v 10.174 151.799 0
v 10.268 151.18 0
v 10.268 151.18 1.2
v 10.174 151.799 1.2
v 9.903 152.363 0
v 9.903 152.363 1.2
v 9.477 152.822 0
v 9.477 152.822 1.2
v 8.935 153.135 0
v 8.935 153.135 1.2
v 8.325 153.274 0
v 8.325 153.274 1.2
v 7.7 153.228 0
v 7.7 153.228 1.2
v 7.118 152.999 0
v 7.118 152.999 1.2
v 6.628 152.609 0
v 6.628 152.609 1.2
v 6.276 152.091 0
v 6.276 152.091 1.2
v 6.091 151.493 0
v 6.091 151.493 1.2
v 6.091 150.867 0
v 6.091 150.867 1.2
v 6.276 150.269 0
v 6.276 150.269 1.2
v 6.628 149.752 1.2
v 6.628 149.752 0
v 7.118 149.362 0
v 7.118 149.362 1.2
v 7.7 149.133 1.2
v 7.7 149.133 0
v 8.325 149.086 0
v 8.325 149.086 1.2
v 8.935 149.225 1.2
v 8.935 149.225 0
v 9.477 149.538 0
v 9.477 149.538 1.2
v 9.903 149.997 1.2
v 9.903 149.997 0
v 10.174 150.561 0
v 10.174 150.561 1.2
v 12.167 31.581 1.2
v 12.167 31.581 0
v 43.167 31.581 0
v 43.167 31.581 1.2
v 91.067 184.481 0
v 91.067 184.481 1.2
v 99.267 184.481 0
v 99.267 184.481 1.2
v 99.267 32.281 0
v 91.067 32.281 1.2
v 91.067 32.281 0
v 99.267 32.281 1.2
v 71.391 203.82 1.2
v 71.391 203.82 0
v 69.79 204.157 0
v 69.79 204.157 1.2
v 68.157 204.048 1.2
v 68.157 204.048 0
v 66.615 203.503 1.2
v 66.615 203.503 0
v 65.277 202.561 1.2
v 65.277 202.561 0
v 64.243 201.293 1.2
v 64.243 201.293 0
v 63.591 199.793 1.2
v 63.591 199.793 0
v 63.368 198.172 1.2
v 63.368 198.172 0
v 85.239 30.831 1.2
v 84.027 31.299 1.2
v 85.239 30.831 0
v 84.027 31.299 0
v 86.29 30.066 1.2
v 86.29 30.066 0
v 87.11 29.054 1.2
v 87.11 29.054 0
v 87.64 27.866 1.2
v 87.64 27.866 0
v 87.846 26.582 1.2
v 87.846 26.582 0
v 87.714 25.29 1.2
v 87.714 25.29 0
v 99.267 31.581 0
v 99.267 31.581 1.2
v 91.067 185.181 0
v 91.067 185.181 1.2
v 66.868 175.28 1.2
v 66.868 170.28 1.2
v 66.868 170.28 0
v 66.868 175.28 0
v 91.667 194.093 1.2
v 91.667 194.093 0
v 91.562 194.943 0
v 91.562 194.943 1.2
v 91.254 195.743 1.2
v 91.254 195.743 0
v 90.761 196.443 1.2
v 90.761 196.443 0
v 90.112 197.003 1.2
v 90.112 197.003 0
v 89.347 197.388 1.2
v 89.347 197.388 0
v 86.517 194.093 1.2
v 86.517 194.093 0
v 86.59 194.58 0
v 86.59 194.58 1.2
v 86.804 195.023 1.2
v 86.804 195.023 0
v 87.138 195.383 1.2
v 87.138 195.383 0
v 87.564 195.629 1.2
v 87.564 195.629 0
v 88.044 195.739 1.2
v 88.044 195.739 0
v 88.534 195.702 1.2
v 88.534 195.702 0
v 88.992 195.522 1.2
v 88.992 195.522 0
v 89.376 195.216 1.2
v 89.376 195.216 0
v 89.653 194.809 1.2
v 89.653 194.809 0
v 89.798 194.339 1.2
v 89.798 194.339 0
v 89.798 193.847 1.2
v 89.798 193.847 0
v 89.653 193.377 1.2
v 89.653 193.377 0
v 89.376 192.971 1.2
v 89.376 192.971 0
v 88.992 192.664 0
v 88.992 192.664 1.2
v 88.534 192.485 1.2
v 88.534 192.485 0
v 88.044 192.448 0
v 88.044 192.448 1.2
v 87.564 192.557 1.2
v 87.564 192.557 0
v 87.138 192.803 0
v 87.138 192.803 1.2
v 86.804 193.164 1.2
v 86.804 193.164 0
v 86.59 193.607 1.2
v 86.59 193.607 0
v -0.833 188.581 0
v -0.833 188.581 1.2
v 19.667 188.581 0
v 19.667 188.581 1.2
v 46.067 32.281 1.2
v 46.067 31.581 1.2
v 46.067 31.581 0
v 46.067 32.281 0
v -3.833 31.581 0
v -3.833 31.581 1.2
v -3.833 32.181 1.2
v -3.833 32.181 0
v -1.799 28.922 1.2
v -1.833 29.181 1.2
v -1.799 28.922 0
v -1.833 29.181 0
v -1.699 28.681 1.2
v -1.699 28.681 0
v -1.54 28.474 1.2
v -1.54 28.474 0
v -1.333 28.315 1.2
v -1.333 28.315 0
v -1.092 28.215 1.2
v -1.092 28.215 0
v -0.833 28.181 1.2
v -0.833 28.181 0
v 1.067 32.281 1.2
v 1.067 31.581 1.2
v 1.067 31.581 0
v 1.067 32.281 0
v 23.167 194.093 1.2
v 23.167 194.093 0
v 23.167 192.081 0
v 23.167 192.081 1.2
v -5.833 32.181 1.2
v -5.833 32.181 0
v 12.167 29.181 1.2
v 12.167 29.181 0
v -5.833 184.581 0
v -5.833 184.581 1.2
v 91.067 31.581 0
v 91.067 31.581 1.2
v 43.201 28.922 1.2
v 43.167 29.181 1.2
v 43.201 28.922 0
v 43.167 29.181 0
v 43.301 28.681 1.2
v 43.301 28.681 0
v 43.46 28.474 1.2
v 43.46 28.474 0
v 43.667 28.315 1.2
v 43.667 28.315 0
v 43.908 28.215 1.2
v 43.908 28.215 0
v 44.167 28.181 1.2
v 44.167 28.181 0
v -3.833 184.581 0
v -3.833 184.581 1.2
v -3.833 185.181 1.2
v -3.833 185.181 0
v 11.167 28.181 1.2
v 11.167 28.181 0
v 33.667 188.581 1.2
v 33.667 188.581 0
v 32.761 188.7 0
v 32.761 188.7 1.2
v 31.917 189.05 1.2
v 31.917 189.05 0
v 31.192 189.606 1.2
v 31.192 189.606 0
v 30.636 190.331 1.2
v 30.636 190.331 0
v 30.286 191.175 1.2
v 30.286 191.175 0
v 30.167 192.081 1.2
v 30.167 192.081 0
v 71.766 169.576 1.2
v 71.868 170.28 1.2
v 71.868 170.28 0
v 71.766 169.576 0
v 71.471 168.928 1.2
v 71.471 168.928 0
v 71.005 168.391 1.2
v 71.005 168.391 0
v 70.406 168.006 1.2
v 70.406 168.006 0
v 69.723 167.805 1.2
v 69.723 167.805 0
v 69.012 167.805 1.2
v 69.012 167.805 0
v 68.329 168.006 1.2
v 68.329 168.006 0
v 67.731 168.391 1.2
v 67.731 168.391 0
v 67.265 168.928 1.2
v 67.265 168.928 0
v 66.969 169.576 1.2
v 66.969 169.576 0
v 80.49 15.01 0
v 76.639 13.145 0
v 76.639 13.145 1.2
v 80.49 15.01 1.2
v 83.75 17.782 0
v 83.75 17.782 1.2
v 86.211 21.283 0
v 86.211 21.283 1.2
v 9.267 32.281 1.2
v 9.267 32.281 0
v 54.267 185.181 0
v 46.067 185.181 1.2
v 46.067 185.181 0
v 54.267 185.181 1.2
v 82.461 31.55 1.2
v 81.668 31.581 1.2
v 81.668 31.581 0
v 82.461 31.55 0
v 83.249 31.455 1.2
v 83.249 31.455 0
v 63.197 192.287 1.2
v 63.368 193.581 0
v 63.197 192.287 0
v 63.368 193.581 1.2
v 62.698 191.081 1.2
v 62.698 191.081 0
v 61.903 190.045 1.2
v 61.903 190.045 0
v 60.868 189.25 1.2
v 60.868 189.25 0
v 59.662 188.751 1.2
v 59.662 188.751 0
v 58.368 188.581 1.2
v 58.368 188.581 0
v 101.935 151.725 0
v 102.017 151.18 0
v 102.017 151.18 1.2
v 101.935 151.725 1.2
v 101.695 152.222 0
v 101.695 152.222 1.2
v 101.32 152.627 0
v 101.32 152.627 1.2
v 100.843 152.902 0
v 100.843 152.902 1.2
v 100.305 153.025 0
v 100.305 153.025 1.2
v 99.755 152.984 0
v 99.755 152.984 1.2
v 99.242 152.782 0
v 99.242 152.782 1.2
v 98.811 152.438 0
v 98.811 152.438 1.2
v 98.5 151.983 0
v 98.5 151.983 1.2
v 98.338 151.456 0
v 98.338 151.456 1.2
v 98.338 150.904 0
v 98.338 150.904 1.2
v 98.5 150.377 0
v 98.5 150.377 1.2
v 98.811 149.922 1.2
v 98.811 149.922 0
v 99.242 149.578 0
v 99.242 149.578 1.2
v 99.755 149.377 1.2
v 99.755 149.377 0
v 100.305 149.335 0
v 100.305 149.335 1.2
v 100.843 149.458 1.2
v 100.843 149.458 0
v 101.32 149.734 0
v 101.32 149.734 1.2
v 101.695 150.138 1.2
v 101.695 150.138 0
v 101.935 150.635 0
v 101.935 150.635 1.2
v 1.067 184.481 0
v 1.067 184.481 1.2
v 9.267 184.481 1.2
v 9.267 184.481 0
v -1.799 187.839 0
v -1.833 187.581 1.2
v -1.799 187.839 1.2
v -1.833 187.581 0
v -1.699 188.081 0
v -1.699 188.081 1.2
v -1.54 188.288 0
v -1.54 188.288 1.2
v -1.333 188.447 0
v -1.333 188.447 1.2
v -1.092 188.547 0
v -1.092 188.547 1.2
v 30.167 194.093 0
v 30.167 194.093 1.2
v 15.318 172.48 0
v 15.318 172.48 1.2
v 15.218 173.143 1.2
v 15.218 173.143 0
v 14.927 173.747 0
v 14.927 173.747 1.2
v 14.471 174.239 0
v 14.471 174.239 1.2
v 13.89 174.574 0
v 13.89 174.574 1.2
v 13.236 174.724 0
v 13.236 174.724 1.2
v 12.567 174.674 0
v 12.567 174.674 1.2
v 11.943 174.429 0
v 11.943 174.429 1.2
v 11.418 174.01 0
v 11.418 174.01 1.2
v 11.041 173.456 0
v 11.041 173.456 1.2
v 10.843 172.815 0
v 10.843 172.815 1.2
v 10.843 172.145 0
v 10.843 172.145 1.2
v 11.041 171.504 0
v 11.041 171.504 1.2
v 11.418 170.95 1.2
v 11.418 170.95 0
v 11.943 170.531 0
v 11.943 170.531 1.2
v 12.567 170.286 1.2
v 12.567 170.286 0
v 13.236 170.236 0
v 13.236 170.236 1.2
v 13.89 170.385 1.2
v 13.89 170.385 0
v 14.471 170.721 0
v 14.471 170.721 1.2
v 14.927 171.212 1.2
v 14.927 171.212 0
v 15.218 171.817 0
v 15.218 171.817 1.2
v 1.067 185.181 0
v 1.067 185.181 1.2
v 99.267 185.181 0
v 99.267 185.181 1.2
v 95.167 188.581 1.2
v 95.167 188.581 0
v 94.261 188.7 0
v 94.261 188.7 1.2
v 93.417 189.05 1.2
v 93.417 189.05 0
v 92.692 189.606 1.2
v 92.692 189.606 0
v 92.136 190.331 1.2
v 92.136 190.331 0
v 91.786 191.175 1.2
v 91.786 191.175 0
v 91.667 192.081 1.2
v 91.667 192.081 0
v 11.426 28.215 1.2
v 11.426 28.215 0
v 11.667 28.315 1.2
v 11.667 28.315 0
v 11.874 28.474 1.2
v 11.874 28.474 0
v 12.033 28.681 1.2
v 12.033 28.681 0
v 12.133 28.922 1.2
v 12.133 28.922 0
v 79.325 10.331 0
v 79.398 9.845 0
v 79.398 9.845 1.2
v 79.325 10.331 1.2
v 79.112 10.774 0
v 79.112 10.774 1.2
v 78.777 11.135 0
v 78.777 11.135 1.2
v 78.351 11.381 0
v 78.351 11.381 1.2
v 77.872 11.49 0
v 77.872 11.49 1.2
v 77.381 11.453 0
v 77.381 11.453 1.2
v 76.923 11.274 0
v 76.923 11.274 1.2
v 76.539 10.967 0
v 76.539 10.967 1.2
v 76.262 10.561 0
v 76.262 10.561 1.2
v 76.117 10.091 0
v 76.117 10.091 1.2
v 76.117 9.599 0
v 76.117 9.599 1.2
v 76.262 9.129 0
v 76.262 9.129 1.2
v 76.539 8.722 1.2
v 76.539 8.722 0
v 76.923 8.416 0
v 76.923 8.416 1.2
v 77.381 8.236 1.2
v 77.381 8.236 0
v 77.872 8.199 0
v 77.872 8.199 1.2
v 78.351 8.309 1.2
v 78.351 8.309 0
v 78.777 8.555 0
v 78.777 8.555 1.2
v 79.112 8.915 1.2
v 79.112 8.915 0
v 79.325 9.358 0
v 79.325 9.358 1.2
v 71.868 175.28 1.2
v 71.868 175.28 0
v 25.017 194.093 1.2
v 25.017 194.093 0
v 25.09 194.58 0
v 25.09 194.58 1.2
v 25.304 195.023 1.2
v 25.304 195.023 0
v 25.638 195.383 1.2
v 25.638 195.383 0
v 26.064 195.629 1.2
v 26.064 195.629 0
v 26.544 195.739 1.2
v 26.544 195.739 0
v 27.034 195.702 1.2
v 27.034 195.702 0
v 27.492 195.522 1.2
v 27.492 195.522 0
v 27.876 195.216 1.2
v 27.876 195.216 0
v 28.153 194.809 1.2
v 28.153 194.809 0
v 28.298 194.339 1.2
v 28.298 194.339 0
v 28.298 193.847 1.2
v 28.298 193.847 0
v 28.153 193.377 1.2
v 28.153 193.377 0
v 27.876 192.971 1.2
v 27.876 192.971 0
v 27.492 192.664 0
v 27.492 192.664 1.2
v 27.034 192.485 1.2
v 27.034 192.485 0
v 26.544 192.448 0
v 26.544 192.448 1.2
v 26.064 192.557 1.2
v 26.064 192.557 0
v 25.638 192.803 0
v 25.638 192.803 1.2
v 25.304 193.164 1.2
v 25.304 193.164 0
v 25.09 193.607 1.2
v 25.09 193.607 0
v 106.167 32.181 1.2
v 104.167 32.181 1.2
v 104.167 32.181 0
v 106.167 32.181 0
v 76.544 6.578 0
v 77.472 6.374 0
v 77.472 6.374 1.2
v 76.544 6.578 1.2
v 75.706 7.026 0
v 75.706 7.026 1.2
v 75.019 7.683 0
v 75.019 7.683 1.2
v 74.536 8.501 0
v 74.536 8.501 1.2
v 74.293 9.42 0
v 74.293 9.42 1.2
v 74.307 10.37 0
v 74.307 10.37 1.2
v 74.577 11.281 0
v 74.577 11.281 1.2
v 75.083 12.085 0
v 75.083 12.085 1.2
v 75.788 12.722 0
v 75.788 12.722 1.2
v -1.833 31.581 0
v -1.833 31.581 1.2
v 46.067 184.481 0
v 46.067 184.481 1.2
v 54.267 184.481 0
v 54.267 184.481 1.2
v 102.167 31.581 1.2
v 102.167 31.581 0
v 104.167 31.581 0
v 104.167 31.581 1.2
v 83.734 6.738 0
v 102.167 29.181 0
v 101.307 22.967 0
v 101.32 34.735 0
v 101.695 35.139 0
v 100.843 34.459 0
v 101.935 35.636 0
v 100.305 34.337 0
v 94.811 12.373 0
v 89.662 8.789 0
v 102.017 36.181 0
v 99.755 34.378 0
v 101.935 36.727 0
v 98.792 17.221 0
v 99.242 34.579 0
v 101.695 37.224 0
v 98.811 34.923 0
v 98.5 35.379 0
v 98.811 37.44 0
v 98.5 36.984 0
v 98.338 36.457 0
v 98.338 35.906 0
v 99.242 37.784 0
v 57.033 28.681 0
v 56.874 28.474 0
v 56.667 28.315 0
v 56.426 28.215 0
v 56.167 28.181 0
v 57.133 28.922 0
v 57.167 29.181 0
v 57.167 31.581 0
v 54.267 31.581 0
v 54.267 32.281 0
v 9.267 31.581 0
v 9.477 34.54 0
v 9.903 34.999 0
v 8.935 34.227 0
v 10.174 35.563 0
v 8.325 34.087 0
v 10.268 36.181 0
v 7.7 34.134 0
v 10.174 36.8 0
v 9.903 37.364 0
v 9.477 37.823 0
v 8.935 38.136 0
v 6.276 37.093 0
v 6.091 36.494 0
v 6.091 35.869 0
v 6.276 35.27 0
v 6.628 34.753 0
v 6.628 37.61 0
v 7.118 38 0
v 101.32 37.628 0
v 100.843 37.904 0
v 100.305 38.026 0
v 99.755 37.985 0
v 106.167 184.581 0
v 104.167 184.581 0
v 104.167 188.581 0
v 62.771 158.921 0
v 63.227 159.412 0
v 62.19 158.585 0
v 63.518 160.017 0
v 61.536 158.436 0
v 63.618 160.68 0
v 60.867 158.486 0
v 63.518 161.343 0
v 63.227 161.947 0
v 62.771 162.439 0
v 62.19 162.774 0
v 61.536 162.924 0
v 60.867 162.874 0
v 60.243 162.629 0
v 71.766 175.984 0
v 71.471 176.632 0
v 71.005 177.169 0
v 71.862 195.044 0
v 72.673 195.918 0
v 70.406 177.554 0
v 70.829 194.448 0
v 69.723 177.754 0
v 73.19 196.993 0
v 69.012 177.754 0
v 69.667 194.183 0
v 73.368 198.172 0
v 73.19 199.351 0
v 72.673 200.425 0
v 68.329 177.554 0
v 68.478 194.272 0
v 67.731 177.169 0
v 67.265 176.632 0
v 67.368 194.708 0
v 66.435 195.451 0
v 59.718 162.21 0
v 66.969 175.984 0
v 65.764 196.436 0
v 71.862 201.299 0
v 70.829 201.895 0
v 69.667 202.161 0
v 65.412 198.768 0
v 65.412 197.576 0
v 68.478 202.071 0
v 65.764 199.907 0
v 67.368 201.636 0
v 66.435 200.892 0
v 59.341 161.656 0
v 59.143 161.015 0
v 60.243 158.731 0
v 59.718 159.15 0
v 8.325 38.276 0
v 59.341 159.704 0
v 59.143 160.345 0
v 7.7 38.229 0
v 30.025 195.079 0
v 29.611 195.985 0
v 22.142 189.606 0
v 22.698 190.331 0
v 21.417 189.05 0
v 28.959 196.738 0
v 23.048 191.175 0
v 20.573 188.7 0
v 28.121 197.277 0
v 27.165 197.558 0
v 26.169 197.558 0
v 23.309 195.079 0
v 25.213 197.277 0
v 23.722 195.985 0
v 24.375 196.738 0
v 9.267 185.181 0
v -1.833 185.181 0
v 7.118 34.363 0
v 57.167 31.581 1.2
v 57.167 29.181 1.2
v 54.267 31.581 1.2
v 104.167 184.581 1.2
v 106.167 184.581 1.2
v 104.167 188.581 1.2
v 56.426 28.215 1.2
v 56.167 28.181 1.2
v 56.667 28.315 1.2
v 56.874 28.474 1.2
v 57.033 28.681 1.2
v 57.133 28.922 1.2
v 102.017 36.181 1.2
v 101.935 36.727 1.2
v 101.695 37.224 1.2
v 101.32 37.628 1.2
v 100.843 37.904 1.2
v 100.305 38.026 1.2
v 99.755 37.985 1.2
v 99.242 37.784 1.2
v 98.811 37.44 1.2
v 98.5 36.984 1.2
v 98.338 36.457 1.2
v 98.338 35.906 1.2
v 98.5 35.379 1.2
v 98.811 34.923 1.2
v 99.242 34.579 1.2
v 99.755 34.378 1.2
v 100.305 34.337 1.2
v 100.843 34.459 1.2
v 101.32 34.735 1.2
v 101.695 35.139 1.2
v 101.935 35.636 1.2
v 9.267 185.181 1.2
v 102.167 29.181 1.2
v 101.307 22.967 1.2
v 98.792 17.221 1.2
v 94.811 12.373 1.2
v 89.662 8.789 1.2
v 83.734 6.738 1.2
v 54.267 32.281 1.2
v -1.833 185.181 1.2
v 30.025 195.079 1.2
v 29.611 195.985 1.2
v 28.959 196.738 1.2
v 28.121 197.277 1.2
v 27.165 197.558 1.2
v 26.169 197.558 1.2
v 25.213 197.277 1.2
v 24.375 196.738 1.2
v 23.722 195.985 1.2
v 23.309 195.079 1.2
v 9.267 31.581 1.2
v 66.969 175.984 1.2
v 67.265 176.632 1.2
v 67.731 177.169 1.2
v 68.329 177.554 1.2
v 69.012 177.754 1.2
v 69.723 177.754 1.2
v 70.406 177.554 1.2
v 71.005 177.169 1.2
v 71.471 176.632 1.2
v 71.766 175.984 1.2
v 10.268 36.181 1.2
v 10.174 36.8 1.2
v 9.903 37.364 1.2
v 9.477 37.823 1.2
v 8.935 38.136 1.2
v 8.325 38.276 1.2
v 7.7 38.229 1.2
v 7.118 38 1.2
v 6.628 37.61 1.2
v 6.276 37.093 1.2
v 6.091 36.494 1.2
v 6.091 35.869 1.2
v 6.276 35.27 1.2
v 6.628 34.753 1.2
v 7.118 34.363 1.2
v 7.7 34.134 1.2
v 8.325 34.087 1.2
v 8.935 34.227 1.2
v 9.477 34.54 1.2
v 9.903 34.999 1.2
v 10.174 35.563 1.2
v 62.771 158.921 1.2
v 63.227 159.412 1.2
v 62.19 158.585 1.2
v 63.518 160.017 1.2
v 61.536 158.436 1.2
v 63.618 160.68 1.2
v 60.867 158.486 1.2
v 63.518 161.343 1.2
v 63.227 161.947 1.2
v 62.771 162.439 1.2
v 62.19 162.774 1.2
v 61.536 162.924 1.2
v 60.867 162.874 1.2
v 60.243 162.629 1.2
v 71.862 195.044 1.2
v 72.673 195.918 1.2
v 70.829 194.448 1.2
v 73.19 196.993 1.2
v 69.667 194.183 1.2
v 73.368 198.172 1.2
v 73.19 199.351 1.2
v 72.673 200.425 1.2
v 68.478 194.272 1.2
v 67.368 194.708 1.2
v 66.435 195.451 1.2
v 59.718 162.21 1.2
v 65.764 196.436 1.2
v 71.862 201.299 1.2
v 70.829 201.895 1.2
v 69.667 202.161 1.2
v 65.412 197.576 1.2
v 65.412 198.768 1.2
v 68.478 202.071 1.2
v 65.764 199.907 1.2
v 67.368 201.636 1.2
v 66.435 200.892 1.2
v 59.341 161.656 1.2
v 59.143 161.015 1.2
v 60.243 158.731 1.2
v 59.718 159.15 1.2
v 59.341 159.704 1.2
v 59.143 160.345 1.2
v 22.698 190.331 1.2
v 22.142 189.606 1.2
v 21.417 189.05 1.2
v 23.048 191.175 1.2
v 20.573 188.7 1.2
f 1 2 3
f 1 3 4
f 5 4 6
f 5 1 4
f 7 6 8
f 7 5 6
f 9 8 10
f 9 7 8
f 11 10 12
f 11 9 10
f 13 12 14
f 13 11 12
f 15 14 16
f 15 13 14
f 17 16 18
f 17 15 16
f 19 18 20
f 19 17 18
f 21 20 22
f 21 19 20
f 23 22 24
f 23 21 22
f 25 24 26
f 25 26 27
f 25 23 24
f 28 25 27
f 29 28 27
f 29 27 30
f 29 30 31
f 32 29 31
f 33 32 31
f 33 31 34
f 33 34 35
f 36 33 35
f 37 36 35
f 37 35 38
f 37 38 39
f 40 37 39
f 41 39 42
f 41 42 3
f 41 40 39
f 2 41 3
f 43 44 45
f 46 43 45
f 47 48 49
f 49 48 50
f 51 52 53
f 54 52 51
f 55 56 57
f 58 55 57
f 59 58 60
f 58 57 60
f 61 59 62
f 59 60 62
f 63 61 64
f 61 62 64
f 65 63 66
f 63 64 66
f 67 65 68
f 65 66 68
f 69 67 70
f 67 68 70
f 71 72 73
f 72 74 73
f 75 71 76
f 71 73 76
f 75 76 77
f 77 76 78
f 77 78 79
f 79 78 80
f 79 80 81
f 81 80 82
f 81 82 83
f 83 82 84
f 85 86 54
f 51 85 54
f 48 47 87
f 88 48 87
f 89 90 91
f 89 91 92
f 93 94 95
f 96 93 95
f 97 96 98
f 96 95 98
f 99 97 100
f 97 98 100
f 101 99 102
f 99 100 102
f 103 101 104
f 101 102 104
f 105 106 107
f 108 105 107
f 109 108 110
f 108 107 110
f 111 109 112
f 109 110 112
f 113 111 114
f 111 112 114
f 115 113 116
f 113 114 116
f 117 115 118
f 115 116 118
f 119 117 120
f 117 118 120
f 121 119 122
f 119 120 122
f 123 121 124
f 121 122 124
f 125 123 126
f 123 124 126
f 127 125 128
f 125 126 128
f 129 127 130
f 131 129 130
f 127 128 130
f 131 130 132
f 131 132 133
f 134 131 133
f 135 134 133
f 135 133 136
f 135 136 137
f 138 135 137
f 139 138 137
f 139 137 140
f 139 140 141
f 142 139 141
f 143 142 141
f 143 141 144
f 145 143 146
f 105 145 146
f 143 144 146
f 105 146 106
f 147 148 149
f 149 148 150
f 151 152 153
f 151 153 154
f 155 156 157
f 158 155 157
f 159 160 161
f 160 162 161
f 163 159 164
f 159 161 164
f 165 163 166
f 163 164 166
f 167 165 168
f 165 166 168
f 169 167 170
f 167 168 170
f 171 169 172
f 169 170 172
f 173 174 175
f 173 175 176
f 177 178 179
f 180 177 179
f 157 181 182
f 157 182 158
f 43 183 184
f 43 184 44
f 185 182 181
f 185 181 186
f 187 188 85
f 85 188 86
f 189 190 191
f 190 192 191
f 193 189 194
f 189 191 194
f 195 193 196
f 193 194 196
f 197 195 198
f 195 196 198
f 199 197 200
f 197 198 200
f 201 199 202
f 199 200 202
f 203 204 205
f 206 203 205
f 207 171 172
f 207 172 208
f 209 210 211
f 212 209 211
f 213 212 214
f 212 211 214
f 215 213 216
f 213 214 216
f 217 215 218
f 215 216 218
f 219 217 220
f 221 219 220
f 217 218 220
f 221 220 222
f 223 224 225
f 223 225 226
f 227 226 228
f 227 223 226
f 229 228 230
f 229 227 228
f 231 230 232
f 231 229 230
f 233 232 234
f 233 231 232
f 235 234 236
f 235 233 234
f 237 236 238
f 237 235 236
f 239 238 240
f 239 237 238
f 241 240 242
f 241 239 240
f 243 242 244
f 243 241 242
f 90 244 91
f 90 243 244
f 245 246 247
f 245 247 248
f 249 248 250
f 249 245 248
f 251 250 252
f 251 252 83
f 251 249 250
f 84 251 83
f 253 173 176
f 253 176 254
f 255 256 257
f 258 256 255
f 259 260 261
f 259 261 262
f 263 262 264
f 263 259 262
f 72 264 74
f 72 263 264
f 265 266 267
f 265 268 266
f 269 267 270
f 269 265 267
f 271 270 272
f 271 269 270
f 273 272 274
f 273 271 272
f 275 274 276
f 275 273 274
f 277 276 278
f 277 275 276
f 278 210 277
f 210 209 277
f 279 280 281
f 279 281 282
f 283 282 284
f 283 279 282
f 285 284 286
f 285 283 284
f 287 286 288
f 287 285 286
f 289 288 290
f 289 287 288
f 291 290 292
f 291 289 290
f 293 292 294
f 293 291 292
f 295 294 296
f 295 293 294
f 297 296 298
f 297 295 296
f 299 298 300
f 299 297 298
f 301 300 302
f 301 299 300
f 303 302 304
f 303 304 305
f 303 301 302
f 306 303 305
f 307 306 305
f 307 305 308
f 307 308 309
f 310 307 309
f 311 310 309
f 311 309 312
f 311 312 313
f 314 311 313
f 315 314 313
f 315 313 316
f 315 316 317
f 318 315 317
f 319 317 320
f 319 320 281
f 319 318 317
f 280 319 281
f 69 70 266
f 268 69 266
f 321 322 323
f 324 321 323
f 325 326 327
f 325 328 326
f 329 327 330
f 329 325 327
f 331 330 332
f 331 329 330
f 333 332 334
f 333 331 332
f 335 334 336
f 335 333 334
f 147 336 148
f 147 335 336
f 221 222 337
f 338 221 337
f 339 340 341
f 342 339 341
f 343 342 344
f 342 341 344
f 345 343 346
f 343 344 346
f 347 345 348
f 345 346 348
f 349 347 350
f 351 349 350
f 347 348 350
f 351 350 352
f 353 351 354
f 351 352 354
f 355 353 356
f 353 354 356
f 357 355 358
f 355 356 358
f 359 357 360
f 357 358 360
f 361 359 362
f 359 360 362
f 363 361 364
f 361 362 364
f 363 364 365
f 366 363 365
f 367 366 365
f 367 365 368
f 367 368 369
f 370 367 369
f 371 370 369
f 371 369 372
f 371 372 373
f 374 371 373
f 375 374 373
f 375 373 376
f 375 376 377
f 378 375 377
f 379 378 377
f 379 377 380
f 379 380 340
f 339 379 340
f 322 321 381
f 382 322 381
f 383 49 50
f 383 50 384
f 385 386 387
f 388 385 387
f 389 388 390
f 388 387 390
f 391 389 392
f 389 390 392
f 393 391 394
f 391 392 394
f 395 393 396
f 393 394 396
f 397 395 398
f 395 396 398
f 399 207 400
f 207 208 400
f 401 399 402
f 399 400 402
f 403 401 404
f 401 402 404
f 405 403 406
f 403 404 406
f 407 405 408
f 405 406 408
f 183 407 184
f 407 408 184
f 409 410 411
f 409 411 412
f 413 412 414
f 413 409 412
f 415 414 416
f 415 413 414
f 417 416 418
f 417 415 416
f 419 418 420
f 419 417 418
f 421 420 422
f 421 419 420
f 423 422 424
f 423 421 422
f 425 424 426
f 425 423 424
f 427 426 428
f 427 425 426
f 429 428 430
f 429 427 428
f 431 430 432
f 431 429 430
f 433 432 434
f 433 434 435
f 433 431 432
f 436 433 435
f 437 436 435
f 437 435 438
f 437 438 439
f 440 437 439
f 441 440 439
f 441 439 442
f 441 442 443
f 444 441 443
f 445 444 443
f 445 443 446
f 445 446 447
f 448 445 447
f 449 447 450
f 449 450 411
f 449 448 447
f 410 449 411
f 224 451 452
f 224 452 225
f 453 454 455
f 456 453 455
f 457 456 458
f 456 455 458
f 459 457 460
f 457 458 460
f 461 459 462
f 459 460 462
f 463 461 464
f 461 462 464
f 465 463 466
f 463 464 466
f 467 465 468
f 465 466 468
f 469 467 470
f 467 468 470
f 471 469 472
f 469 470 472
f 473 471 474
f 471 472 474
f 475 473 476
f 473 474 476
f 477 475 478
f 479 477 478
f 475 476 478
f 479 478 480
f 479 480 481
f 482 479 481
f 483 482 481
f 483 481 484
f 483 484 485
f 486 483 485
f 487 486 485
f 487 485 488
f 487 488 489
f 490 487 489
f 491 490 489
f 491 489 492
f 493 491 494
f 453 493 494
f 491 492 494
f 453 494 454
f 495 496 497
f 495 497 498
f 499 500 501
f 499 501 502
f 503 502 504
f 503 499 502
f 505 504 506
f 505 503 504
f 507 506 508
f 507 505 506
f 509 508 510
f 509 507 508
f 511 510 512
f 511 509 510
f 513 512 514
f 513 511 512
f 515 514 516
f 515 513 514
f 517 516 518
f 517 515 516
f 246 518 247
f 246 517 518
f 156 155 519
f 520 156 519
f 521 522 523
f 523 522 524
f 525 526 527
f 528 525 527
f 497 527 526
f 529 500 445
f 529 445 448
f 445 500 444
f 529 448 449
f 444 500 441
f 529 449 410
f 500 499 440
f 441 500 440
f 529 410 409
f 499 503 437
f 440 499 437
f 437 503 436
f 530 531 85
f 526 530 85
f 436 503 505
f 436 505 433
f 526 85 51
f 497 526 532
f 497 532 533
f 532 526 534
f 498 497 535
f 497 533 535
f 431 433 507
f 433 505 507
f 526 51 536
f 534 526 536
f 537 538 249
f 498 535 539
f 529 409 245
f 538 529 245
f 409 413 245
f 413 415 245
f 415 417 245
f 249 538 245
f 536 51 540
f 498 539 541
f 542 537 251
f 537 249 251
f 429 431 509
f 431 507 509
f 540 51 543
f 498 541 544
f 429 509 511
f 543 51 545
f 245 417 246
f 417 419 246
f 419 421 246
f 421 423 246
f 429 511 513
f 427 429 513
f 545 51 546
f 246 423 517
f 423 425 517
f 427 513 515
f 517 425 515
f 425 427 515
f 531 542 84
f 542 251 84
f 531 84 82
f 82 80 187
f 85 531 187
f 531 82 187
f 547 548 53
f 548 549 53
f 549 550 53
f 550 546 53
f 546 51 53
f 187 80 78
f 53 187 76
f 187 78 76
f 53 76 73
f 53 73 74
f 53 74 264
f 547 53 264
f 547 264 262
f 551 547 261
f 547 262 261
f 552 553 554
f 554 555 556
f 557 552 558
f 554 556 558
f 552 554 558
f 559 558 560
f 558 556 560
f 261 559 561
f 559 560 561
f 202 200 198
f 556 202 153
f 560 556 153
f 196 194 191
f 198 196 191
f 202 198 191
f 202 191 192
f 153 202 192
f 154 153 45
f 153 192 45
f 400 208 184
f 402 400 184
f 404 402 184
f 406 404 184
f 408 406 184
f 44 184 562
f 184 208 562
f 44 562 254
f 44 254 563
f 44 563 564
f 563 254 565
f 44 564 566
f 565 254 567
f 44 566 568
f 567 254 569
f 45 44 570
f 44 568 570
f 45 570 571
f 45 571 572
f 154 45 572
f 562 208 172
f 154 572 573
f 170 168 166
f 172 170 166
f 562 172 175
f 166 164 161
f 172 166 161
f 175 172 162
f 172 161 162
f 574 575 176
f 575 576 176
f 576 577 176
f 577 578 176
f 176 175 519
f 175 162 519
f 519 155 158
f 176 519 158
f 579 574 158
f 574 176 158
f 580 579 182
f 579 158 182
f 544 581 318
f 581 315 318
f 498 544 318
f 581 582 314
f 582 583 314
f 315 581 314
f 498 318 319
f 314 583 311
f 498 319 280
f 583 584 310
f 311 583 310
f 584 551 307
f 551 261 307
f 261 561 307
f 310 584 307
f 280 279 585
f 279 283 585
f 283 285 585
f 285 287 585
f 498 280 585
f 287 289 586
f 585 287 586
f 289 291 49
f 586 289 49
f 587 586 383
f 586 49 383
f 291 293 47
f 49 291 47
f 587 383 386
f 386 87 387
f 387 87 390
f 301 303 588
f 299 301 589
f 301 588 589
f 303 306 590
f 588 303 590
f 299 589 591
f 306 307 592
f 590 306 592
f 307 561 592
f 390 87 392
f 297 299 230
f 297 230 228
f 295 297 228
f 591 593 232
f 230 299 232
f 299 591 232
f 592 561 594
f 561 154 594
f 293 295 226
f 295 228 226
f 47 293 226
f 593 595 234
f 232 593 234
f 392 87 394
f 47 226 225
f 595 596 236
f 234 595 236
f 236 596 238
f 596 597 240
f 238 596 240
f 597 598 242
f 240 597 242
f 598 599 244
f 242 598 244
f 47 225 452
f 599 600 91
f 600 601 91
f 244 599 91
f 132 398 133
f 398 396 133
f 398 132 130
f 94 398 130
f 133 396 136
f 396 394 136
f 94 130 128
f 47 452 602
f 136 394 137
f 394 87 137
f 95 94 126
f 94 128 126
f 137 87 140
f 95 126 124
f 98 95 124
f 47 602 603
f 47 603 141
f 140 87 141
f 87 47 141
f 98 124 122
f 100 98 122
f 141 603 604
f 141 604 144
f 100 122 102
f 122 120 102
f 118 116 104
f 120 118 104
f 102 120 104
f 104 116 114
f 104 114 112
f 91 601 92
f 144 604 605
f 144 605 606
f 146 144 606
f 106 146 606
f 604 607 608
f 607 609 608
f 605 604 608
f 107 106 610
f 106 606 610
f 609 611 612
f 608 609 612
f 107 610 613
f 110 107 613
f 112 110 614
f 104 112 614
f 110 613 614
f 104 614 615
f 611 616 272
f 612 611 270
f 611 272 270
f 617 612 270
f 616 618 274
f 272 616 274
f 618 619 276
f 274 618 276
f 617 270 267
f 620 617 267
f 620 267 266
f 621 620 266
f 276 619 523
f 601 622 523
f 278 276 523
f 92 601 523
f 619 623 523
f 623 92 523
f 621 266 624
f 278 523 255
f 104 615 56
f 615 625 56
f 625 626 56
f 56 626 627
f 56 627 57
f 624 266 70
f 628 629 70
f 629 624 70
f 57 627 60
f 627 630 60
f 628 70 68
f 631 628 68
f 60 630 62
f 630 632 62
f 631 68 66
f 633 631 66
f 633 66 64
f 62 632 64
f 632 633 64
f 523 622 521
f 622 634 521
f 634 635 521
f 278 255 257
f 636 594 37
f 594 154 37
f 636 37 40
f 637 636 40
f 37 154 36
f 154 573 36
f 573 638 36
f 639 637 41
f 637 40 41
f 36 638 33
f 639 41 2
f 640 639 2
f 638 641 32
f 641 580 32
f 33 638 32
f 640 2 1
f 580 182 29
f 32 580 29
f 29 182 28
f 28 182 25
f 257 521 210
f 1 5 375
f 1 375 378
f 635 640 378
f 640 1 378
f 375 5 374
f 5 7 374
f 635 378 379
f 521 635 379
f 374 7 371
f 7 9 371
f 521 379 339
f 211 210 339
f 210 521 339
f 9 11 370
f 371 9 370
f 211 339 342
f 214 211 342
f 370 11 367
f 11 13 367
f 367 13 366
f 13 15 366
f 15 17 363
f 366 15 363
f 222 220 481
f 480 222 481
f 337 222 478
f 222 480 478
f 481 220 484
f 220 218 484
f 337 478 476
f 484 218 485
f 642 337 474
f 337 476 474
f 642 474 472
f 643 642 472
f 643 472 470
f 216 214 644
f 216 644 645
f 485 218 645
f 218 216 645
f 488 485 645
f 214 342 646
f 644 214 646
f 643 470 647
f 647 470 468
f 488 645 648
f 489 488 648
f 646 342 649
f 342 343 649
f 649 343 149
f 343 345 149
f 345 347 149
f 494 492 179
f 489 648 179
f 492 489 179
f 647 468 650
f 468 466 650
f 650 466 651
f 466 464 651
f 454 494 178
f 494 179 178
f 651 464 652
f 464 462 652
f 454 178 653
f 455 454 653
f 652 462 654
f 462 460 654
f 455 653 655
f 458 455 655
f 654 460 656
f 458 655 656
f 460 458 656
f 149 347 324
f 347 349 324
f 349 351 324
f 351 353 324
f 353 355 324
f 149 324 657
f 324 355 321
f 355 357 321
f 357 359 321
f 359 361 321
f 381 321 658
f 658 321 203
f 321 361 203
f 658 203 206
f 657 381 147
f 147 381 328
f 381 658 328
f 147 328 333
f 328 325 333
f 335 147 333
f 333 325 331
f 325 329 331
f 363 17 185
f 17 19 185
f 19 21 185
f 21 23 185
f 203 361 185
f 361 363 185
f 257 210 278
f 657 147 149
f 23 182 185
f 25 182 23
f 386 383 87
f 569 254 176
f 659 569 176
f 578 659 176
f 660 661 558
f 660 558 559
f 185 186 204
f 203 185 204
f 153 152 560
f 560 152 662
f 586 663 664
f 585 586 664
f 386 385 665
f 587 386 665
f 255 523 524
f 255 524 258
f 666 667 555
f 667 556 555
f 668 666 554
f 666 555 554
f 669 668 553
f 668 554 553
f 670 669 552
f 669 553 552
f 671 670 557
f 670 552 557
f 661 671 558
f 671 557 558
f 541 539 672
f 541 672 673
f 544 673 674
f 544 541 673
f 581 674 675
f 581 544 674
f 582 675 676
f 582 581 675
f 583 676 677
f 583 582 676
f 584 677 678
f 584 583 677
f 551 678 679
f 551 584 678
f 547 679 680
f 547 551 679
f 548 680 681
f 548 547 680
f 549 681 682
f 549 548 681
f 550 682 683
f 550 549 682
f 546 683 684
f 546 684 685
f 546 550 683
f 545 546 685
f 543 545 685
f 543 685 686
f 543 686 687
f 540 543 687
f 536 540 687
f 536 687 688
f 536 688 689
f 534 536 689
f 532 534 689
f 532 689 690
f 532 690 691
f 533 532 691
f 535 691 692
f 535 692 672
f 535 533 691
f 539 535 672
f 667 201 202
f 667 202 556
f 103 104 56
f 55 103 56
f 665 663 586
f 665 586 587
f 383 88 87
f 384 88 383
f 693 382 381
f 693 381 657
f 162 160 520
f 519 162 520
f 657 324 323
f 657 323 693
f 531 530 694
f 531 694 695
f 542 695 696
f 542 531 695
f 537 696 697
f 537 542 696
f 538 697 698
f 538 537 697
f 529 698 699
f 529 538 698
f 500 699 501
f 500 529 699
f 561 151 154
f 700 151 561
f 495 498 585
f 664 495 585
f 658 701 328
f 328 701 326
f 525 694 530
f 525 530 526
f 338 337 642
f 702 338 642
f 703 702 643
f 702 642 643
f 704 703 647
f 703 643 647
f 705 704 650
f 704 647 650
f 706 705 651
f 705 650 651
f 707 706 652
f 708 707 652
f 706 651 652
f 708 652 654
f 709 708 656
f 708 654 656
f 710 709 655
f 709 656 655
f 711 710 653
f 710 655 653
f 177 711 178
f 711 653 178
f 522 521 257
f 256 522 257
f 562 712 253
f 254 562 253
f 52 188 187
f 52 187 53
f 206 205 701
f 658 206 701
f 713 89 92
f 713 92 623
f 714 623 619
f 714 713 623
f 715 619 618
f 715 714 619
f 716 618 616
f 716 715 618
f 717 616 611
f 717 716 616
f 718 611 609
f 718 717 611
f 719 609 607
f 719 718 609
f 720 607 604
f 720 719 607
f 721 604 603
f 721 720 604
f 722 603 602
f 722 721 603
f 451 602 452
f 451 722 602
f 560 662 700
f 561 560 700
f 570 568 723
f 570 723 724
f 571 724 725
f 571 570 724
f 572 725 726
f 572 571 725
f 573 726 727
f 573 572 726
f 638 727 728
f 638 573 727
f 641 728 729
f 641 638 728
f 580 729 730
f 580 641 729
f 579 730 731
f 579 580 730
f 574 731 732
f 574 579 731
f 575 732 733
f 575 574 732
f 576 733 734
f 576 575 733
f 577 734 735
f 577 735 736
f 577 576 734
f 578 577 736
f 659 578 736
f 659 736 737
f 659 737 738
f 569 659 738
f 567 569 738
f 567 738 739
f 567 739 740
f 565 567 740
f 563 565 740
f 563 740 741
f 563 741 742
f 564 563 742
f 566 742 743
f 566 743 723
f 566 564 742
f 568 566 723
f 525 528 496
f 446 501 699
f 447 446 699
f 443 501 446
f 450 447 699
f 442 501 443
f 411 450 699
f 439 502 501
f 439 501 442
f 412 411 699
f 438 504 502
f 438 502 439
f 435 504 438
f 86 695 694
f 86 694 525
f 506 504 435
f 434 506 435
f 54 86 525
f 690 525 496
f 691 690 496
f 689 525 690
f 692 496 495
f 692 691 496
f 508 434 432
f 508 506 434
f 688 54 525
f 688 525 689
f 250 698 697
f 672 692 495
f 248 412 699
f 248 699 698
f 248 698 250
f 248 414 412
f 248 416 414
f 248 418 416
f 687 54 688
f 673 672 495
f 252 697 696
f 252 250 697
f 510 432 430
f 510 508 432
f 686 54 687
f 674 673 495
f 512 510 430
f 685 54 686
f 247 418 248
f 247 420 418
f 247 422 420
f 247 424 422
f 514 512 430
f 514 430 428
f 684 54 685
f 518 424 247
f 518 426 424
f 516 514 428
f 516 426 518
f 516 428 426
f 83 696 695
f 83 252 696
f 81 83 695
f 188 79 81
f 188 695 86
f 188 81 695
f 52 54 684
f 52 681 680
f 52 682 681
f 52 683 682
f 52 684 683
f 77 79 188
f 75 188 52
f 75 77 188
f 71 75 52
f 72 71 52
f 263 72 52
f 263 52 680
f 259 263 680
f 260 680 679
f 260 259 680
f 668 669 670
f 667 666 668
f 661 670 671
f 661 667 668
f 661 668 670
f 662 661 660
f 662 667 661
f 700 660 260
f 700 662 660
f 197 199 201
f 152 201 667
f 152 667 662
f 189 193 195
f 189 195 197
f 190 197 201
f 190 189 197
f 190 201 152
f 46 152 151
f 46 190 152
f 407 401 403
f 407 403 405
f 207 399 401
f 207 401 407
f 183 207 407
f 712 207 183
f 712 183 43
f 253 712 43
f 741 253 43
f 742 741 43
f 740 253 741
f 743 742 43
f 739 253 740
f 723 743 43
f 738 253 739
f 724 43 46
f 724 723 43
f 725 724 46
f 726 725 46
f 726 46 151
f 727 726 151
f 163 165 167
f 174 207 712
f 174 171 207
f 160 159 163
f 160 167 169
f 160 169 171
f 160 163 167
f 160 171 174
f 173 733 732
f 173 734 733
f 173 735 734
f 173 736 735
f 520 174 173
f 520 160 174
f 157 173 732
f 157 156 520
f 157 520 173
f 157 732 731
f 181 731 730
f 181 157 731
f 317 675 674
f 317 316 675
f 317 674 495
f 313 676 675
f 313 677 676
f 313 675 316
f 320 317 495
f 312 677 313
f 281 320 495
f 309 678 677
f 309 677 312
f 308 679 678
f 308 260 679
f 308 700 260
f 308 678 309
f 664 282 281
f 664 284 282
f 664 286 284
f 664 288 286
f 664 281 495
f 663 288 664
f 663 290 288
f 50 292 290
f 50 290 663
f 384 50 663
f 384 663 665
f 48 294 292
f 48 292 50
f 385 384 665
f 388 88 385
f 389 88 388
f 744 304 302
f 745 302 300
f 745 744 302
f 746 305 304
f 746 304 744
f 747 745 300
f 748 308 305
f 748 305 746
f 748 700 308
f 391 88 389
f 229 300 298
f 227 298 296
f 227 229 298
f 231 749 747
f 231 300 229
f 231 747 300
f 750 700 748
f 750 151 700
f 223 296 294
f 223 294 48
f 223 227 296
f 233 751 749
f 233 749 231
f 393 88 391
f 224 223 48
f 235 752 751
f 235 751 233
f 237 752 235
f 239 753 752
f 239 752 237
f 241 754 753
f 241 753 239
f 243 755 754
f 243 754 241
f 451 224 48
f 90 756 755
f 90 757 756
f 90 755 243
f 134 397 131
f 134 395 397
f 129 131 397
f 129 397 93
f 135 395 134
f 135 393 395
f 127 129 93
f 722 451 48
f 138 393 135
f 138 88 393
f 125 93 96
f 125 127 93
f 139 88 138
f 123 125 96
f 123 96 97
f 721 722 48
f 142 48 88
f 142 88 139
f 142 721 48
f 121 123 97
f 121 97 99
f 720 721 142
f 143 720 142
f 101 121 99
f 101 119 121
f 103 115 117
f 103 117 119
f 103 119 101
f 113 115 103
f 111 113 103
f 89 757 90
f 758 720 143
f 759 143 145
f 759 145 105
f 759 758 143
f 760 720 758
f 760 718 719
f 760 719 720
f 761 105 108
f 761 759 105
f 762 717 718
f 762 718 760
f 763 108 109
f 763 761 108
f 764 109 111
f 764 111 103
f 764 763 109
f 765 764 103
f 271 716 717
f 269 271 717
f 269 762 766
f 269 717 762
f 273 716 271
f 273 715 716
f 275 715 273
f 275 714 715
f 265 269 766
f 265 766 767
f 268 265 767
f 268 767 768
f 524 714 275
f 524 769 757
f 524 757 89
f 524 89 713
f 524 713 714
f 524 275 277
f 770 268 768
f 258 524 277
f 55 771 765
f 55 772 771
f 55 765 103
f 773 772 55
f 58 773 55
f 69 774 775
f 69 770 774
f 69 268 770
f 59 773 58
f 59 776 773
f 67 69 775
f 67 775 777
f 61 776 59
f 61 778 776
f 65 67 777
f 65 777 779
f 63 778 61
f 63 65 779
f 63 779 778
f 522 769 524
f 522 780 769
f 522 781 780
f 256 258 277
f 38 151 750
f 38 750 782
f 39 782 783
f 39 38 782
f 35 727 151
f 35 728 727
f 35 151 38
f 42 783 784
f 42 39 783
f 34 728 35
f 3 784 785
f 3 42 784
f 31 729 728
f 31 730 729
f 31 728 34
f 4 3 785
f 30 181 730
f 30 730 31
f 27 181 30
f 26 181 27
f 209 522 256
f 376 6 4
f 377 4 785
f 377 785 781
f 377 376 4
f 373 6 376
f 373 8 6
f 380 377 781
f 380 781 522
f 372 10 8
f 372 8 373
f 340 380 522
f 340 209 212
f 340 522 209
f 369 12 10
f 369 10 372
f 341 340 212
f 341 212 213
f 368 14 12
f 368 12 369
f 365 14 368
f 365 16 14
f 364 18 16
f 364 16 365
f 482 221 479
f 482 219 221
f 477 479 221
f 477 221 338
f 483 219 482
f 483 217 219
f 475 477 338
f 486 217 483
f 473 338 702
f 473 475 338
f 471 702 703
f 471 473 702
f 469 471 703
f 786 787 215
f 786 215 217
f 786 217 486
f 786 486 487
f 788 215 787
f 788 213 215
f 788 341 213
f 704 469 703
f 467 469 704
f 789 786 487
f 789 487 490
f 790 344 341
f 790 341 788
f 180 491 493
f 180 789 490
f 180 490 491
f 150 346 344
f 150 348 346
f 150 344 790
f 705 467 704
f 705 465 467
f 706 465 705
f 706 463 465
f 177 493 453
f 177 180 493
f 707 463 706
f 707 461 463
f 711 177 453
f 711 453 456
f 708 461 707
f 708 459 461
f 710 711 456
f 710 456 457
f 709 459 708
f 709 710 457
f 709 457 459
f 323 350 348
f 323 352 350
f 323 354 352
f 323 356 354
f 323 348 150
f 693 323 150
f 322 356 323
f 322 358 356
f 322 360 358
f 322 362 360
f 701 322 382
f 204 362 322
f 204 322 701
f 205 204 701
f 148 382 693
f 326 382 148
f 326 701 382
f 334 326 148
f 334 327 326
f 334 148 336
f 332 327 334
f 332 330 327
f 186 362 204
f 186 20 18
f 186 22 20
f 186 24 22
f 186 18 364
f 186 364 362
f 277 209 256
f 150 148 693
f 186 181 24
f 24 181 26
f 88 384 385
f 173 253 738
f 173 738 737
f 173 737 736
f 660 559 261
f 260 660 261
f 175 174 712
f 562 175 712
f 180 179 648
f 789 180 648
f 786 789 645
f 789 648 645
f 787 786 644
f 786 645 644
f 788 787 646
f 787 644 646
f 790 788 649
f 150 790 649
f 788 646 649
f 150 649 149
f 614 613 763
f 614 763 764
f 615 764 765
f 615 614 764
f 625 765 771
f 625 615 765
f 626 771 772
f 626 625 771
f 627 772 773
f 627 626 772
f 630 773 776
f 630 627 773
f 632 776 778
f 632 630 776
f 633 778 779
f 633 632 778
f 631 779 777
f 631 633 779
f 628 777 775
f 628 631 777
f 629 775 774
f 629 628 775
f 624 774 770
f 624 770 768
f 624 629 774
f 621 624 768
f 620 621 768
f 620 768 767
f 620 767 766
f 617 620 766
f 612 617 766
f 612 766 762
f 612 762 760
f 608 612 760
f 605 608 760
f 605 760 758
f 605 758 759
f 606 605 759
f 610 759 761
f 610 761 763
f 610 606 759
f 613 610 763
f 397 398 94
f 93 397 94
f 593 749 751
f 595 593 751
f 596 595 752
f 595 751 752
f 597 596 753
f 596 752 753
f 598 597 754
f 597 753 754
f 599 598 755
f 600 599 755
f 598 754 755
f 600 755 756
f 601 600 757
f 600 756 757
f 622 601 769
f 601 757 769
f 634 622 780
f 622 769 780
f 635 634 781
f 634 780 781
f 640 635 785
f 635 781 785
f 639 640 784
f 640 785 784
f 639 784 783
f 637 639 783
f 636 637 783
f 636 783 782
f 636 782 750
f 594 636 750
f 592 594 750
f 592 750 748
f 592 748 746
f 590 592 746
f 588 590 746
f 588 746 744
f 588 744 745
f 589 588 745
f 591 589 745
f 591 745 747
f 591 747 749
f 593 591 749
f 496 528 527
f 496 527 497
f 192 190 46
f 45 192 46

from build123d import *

# Parameters (mm, degrees)
SKETCH2_W           = 112.00010125
SKETCH2_H           = 190.5995575
SKETCH2_R           = 2.1
SKETCH2_R_2         = 1.85
BOSS_EXTRUDE1_DEPTH = 1.2
SKETCH5_W           = 2
SKETCH5_H           = 37.6
SKETCH5_H_2         = 0.6
CUT_EXTRUDE2_DEPTH  = 247.246128205
CUT_EXTRUDE1_DEPTH  = 247.246128205
SKETCH9_W           = 14
SKETCH9_H           = 3.4
SKETCH9_W_2         = 8.5
BOSS_EXTRUDE5_DEPTH = 1.2
FILLET1_R           = 1
CUT_EXTRUDE4_REACH  = 248.246
SKETCH10_W          = 8.2
SKETCH10_H          = 0.7
SKETCH11_R          = 2.25
CUT_EXTRUDE5_DEPTH  = 247.246128205
BOSS_EXTRUDE6_DEPTH = 1.2
SKETCH13_R          = 1.635773904
CUT_EXTRUDE6_DEPTH  = 248.202612706
SKETCH15_W          = 166.29246115
SKETCH15_H          = 51.52086731
CUT_EXTRUDE7_DEPTH  = 10
SKETCH17_R          = 1.65
BOSS_EXTRUDE7_DEPTH = 1.2
BOSS_EXTRUDE8_START = -1.2
SKETCH18_R          = 1.65
BOSS_EXTRUDE8_DEPTH = 1.2
BOSS_EXTRUDE9_START = -1.2
SKETCH19_R          = 4
BOSS_EXTRUDE9_DEPTH = 1.2
FILLET3_R           = 5
FILLET8_R           = 10
FILLET10_R          = 5


with BuildPart() as part:
    # Sketch2 → Boss-Extrude1 (new body)
    with BuildSketch(Plane.XY):
        with Locations((50.167238625, 126.88082875)):
            Rectangle(SKETCH2_W, SKETCH2_H)
        with Locations((8.16763175, 151.180160625)):
            Circle(SKETCH2_R, mode=Mode.SUBTRACT)
        with Locations((100.1668405, 151.180160625)):
            Circle(SKETCH2_R_2, mode=Mode.SUBTRACT)
        with Locations((100.1668405, 36.181495)):
            Circle(SKETCH2_R_2, mode=Mode.SUBTRACT)
        with Locations((8.16763175, 36.181495)):
            Circle(SKETCH2_R, mode=Mode.SUBTRACT)
    extrude(amount=BOSS_EXTRUDE1_DEPTH)

    # Sketch5 → Cut-Extrude2 (cut, through all)
    with BuildSketch(Plane.XY.offset(1.2)):
        Polygon((-3.832812, 185.1806075), (6.667188, 185.1806075), (6.667188, 222.1806075), (-5.832812, 222.1806075), (-5.832812, 185.1806075), (-5.832812, 184.5806075), (-3.832812, 184.5806075), align=None)
        with Locations((105.16728925, 203.3806075)):
            Rectangle(SKETCH5_W, SKETCH5_H)
        with Locations((-4.832812, 31.88105)):
            Rectangle(SKETCH5_W, SKETCH5_H_2)
        with Locations((105.16728925, 31.88105)):
            Rectangle(SKETCH5_W, SKETCH5_H_2)
    extrude(amount=-CUT_EXTRUDE2_DEPTH, mode=Mode.SUBTRACT)

    # Sketch4 → Cut-Extrude1 (cut, through all)
    with BuildSketch(Plane.XY.offset(1.2)):
        with BuildLine():
            Line((55.16728925, 218.1806075), (98.16728925, 218.1806075))
            ThreePointArc((98.16728925, 218.1806075), (99.581502812, 217.594821062), (100.16728925, 216.1806075))
            Line((100.16728925, 216.1806075), (100.16728925, 192.1806075))
            ThreePointArc((100.16728925, 192.1806075), (99.581502812, 190.766393938), (98.16728925, 190.1806075))
            Line((98.16728925, 190.1806075), (55.16728925, 190.1806075))
            ThreePointArc((55.16728925, 190.1806075), (53.753075688, 190.766393938), (53.16728925, 192.1806075))
            Line((53.16728925, 192.1806075), (53.16728925, 216.1806075))
            ThreePointArc((53.16728925, 216.1806075), (53.753075688, 217.594821062), (55.16728925, 218.1806075))
        make_face()
    extrude(amount=-CUT_EXTRUDE1_DEPTH, mode=Mode.SUBTRACT)

    # Sketch9 → Boss-Extrude5 (add)
    with BuildSketch(Plane.XY.offset(1.2)):
        with Locations((5.167188, 29.88105)):
            Rectangle(SKETCH9_W, SKETCH9_H)
        with Locations((95.16728925, 29.88105)):
            Rectangle(SKETCH9_W, SKETCH9_H)
        with Locations((50.167238625, 29.88105)):
            Rectangle(SKETCH9_W, SKETCH9_H)
        with Locations((2.417188, 186.8806075)):
            Rectangle(SKETCH9_W_2, SKETCH9_H)
    extrude(amount=-BOSS_EXTRUDE5_DEPTH)

    # Fillet1
    fillet1_edges = [part.edges().sort_by_distance(p)[0] for p in [
        (102.16728925, 28.18105, 0.6),
        (88.16728925, 28.18105, 0.6),
        (57.167238625, 28.18105, 0.6),
        (43.167238625, 28.18105, 0.6),
        (12.167188, 28.18105, 0.6),
        (-1.832812, 28.18105, 0.6),
        (-1.832812, 188.5806075, 0.6),
    ]]
    fillet(fillet1_edges, radius=FILLET1_R)

    # Sketch10 → Cut-Extrude4 (cut, up to next)
    with BuildSketch(Plane.XY.offset(1.2), mode=Mode.PRIVATE) as cut_extrude4_sk1:
        with Locations((95.16728925, 31.93105)):
            Rectangle(SKETCH10_W, SKETCH10_H)
    cut_extrude4_tool1 = extrude(cut_extrude4_sk1.sketch, amount=-CUT_EXTRUDE4_REACH, mode=Mode.PRIVATE) & part.part
    # Sketch10 → Cut-Extrude4 (cut, up to next)
    with BuildSketch(Plane.XY.offset(1.2), mode=Mode.PRIVATE) as cut_extrude4_sk2:
        with Locations((50.167238625, 31.93105)):
            Rectangle(SKETCH10_W, SKETCH10_H)
    cut_extrude4_tool2 = extrude(cut_extrude4_sk2.sketch, amount=-CUT_EXTRUDE4_REACH, mode=Mode.PRIVATE) & part.part
    # Sketch10 → Cut-Extrude4 (cut, up to next)
    with BuildSketch(Plane.XY.offset(1.2), mode=Mode.PRIVATE) as cut_extrude4_sk3:
        with Locations((5.167188, 31.93105)):
            Rectangle(SKETCH10_W, SKETCH10_H)
    cut_extrude4_tool3 = extrude(cut_extrude4_sk3.sketch, amount=-CUT_EXTRUDE4_REACH, mode=Mode.PRIVATE) & part.part
    # Sketch10 → Cut-Extrude4 (cut, up to next)
    with BuildSketch(Plane.XY.offset(1.2), mode=Mode.PRIVATE) as cut_extrude4_sk4:
        with Locations((50.167238625, 184.8306075)):
            Rectangle(SKETCH10_W, SKETCH10_H)
    cut_extrude4_tool4 = extrude(cut_extrude4_sk4.sketch, amount=-CUT_EXTRUDE4_REACH, mode=Mode.PRIVATE) & part.part
    # Sketch10 → Cut-Extrude4 (cut, up to next)
    with BuildSketch(Plane.XY.offset(1.2), mode=Mode.PRIVATE) as cut_extrude4_sk5:
        with Locations((95.16728925, 184.8306075)):
            Rectangle(SKETCH10_W, SKETCH10_H)
    cut_extrude4_tool5 = extrude(cut_extrude4_sk5.sketch, amount=-CUT_EXTRUDE4_REACH, mode=Mode.PRIVATE) & part.part
    # Sketch10 → Cut-Extrude4 (cut, up to next)
    with BuildSketch(Plane.XY.offset(1.2), mode=Mode.PRIVATE) as cut_extrude4_sk6:
        with Locations((5.167188, 184.8306075)):
            Rectangle(SKETCH10_W, SKETCH10_H)
    cut_extrude4_tool6 = extrude(cut_extrude4_sk6.sketch, amount=-CUT_EXTRUDE4_REACH, mode=Mode.PRIVATE) & part.part
    add(cut_extrude4_tool1.solids().sort_by_distance((95.167289, 31.93105, 1.2))[0], mode=Mode.SUBTRACT)
    add(cut_extrude4_tool2.solids().sort_by_distance((50.167239, 31.93105, 1.2))[0], mode=Mode.SUBTRACT)
    add(cut_extrude4_tool3.solids().sort_by_distance((5.167188, 31.93105, 1.2))[0], mode=Mode.SUBTRACT)
    add(cut_extrude4_tool4.solids().sort_by_distance((50.167239, 184.830607, 1.2))[0], mode=Mode.SUBTRACT)
    add(cut_extrude4_tool5.solids().sort_by_distance((95.167289, 184.830607, 1.2))[0], mode=Mode.SUBTRACT)
    add(cut_extrude4_tool6.solids().sort_by_distance((5.167188, 184.830607, 1.2))[0], mode=Mode.SUBTRACT)

    # Sketch11 → Cut-Extrude5 (cut, through all)
    with BuildSketch(Plane.XY.offset(1.2)):
        with Locations((61.367697375, 160.67994375)):
            Circle(SKETCH11_R)
        with Locations((13.067697375, 172.47994375)):
            Circle(SKETCH11_R)
        with BuildLine():
            Line((71.867697375, 175.27994375), (71.867697375, 170.27994375))
            ThreePointArc((71.867697375, 170.27994375), (69.367697375, 167.77994375), (66.867697375, 170.27994375))
            Line((66.867697375, 170.27994375), (66.867697375, 175.27994375))
            ThreePointArc((66.867697375, 175.27994375), (69.367697375, 177.77994375), (71.867697375, 175.27994375))
        make_face()
    extrude(amount=-CUT_EXTRUDE5_DEPTH, mode=Mode.SUBTRACT)

    # Sketch12 → Boss-Extrude6 (add)
    with BuildSketch(Plane.XY.offset(1.2)):
        with BuildLine():
            Line((104.16728925, 222.1806075), (104.16728925, 213.7806075))
            ThreePointArc((104.16728925, 213.7806075), (108.36728925, 217.9806075), (104.16728925, 222.1806075))
        make_face()
    extrude(amount=-BOSS_EXTRUDE6_DEPTH)

    # Sketch13 → Cut-Extrude6 (cut, through all)
    with BuildSketch(Plane.XY.offset(1.2)):
        with Locations((104.16728925, 217.9806075)):
            Circle(SKETCH13_R)
        with Locations((47.16728925, 217.9806075)):
            Circle(SKETCH13_R)
        with Locations((10.667188, 217.9806075)):
            Circle(SKETCH13_R)
    extrude(amount=-CUT_EXTRUDE6_DEPTH, mode=Mode.SUBTRACT)

    # Sketch15 → Cut-Extrude7 (cut)
    with BuildSketch(Plane.XY.offset(1.2)):
        with Locations((89.813418575, 214.341041155)):
            Rectangle(SKETCH15_W, SKETCH15_H)
    extrude(amount=-CUT_EXTRUDE7_DEPTH, mode=Mode.SUBTRACT)

    # Sketch17 → Boss-Extrude7 (add)
    # profile 1 of 2: a face of its own
    with BuildSketch(Plane(origin=(0, 0, 0), x_dir=(-1, 0, 0), z_dir=(0, 0, -1))):
        with BuildLine():
            Line((-81.1668405, 188.5806075), (-95.1668405, 188.5806075))
            ThreePointArc((-95.1668405, 188.5806075), (-92.691966766, 189.605733766), (-91.6668405, 192.0806075))
            Line((-91.6668405, 192.0806075), (-91.6668405, 194.093254991))
            ThreePointArc((-91.6668405, 194.093254991), (-88.1668405, 197.593254991), (-84.6668405, 194.093254991))
            Line((-84.6668405, 194.093254991), (-84.6668405, 192.0806075))
            ThreePointArc((-84.6668405, 192.0806075), (-83.641714234, 189.605733766), (-81.1668405, 188.5806075))
        make_face()
        with Locations((-88.1668405, 194.093254991)):
            Circle(SKETCH17_R, mode=Mode.SUBTRACT)
    # profile 2 of 2: a face of its own
    with BuildSketch(Plane(origin=(0, 0, 0), x_dir=(-1, 0, 0), z_dir=(0, 0, -1))):
        with BuildLine():
            Line((-19.6668405, 188.5806075), (-33.6668405, 188.5806075))
            ThreePointArc((-33.6668405, 188.5806075), (-31.191966766, 189.605733766), (-30.1668405, 192.0806075))
            Line((-30.1668405, 192.0806075), (-30.1668405, 194.093254991))
            ThreePointArc((-30.1668405, 194.093254991), (-26.6668405, 197.593254991), (-23.1668405, 194.093254991))
            Line((-23.1668405, 194.093254991), (-23.1668405, 192.0806075))
            ThreePointArc((-23.1668405, 192.0806075), (-22.141714234, 189.605733766), (-19.6668405, 188.5806075))
        make_face()
        with Locations((-26.6668405, 194.093254991)):
            Circle(SKETCH17_R, mode=Mode.SUBTRACT)
    extrude(amount=-BOSS_EXTRUDE7_DEPTH)

    # Sketch18 → Boss-Extrude8 (add)
    with BuildSketch(Plane.XY.offset(1.2).offset(BOSS_EXTRUDE8_START)):
        with BuildLine():
            Line((89.16728925, 28.18105), (101.16728925, 28.18105))
            ThreePointArc((101.16728925, 28.18105), (101.874396031, 28.473943219), (102.16728925, 29.18105))
            ThreePointArc((102.16728925, 29.18105), (94.810709764, 12.373227692), (77.471885747, 6.374283268))
            ThreePointArc((77.471885747, 6.374283268), (74.292882483, 9.419749119), (76.639173718, 13.144778172))
            ThreePointArc((76.639173718, 13.144778172), (84.986182742, 19.306088457), (88.16728925, 29.18105))
            ThreePointArc((88.16728925, 29.18105), (88.460182469, 28.473943219), (89.16728925, 28.18105))
        make_face()
        with Locations((77.748285655, 9.844733678)):
            Circle(SKETCH18_R, mode=Mode.SUBTRACT)
    extrude(amount=BOSS_EXTRUDE8_DEPTH)

    # Sketch19 → Boss-Extrude9 (add)
    with BuildSketch(Plane.XY.offset(1.2).offset(BOSS_EXTRUDE9_START)):
        with BuildLine():
            Line((63.367697375, 188.5806075), (81.1668405, 188.5806075))
            ThreePointArc((81.1668405, 188.5806075), (83.641714234, 189.605733766), (84.6668405, 192.0806075))
            Line((84.6668405, 192.0806075), (84.6668405, 194.093254991))
            ThreePointArc((84.6668405, 194.093254991), (86.152024438, 196.955162788), (89.347135493, 197.388236588))
            Line((89.347135493, 197.388236588), (71.39106022, 203.820280323))
            ThreePointArc((71.39106022, 203.820280323), (65.913726984, 203.077868093), (63.367697375, 198.171740441))
            Line((63.367697375, 198.171740441), (63.367697375, 188.5806075))
        make_face()
        with Locations((69.367697375, 198.171740441)):
            Circle(SKETCH19_R, mode=Mode.SUBTRACT)
    extrude(amount=BOSS_EXTRUDE9_DEPTH)

    # Fillet3
    fillet3_edges = [part.edges().sort_by_distance(p)[0] for p in [
        (63.367697375, 188.5806075, 0.6),
    ]]
    fillet(fillet3_edges, radius=FILLET3_R)

    # Fillet8
    # the kernel refuses this fillet: 10 mm, written as the material it adds along each edge
    with BuildSketch(Plane(origin=(88.16728925, 31.58105, 1.2), x_dir=(0, -1, 0), z_dir=(0, 0, -1))) as fillet8_piece_1:
        with BuildLine():
            CenterArc((10, 6.499230724), FILLET8_R, 180, 40.535802111)
            Line((0, 6.499230724), (-0.2, 6.499230724))
            Line((-0.2, 6.499230724), (-0.2, 0))
            Line((-0.2, 0), (0, -0.2))
            ThreePointArc((0, -0.2), (1.2, -0.2), (2.248, -0.129984614))
            Line((2.248, -0.129984614), (2.4, 0))
        make_face()
    extrude(amount=1.2)

    # Fillet10
    fillet10_edges = [part.edges().sort_by_distance(p)[0] for p in [
        (88.16728925, 29.18105, 0.6),
    ]]
    fillet(fillet10_edges, radius=FILLET10_R)


solid = part.part
